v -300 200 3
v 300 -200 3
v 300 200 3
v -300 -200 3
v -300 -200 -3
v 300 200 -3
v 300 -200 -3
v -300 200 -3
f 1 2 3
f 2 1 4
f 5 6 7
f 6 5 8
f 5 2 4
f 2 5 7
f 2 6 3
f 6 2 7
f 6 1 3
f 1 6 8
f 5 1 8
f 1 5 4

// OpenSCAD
$fn = 64;

sheet_length = 600;   // mm
sheet_width  = 400;   // mm
sheet_thick  = 6;     // mm

color([0.78, 0.67, 0.50])
cube([sheet_length, sheet_width, sheet_thick], center=true);
